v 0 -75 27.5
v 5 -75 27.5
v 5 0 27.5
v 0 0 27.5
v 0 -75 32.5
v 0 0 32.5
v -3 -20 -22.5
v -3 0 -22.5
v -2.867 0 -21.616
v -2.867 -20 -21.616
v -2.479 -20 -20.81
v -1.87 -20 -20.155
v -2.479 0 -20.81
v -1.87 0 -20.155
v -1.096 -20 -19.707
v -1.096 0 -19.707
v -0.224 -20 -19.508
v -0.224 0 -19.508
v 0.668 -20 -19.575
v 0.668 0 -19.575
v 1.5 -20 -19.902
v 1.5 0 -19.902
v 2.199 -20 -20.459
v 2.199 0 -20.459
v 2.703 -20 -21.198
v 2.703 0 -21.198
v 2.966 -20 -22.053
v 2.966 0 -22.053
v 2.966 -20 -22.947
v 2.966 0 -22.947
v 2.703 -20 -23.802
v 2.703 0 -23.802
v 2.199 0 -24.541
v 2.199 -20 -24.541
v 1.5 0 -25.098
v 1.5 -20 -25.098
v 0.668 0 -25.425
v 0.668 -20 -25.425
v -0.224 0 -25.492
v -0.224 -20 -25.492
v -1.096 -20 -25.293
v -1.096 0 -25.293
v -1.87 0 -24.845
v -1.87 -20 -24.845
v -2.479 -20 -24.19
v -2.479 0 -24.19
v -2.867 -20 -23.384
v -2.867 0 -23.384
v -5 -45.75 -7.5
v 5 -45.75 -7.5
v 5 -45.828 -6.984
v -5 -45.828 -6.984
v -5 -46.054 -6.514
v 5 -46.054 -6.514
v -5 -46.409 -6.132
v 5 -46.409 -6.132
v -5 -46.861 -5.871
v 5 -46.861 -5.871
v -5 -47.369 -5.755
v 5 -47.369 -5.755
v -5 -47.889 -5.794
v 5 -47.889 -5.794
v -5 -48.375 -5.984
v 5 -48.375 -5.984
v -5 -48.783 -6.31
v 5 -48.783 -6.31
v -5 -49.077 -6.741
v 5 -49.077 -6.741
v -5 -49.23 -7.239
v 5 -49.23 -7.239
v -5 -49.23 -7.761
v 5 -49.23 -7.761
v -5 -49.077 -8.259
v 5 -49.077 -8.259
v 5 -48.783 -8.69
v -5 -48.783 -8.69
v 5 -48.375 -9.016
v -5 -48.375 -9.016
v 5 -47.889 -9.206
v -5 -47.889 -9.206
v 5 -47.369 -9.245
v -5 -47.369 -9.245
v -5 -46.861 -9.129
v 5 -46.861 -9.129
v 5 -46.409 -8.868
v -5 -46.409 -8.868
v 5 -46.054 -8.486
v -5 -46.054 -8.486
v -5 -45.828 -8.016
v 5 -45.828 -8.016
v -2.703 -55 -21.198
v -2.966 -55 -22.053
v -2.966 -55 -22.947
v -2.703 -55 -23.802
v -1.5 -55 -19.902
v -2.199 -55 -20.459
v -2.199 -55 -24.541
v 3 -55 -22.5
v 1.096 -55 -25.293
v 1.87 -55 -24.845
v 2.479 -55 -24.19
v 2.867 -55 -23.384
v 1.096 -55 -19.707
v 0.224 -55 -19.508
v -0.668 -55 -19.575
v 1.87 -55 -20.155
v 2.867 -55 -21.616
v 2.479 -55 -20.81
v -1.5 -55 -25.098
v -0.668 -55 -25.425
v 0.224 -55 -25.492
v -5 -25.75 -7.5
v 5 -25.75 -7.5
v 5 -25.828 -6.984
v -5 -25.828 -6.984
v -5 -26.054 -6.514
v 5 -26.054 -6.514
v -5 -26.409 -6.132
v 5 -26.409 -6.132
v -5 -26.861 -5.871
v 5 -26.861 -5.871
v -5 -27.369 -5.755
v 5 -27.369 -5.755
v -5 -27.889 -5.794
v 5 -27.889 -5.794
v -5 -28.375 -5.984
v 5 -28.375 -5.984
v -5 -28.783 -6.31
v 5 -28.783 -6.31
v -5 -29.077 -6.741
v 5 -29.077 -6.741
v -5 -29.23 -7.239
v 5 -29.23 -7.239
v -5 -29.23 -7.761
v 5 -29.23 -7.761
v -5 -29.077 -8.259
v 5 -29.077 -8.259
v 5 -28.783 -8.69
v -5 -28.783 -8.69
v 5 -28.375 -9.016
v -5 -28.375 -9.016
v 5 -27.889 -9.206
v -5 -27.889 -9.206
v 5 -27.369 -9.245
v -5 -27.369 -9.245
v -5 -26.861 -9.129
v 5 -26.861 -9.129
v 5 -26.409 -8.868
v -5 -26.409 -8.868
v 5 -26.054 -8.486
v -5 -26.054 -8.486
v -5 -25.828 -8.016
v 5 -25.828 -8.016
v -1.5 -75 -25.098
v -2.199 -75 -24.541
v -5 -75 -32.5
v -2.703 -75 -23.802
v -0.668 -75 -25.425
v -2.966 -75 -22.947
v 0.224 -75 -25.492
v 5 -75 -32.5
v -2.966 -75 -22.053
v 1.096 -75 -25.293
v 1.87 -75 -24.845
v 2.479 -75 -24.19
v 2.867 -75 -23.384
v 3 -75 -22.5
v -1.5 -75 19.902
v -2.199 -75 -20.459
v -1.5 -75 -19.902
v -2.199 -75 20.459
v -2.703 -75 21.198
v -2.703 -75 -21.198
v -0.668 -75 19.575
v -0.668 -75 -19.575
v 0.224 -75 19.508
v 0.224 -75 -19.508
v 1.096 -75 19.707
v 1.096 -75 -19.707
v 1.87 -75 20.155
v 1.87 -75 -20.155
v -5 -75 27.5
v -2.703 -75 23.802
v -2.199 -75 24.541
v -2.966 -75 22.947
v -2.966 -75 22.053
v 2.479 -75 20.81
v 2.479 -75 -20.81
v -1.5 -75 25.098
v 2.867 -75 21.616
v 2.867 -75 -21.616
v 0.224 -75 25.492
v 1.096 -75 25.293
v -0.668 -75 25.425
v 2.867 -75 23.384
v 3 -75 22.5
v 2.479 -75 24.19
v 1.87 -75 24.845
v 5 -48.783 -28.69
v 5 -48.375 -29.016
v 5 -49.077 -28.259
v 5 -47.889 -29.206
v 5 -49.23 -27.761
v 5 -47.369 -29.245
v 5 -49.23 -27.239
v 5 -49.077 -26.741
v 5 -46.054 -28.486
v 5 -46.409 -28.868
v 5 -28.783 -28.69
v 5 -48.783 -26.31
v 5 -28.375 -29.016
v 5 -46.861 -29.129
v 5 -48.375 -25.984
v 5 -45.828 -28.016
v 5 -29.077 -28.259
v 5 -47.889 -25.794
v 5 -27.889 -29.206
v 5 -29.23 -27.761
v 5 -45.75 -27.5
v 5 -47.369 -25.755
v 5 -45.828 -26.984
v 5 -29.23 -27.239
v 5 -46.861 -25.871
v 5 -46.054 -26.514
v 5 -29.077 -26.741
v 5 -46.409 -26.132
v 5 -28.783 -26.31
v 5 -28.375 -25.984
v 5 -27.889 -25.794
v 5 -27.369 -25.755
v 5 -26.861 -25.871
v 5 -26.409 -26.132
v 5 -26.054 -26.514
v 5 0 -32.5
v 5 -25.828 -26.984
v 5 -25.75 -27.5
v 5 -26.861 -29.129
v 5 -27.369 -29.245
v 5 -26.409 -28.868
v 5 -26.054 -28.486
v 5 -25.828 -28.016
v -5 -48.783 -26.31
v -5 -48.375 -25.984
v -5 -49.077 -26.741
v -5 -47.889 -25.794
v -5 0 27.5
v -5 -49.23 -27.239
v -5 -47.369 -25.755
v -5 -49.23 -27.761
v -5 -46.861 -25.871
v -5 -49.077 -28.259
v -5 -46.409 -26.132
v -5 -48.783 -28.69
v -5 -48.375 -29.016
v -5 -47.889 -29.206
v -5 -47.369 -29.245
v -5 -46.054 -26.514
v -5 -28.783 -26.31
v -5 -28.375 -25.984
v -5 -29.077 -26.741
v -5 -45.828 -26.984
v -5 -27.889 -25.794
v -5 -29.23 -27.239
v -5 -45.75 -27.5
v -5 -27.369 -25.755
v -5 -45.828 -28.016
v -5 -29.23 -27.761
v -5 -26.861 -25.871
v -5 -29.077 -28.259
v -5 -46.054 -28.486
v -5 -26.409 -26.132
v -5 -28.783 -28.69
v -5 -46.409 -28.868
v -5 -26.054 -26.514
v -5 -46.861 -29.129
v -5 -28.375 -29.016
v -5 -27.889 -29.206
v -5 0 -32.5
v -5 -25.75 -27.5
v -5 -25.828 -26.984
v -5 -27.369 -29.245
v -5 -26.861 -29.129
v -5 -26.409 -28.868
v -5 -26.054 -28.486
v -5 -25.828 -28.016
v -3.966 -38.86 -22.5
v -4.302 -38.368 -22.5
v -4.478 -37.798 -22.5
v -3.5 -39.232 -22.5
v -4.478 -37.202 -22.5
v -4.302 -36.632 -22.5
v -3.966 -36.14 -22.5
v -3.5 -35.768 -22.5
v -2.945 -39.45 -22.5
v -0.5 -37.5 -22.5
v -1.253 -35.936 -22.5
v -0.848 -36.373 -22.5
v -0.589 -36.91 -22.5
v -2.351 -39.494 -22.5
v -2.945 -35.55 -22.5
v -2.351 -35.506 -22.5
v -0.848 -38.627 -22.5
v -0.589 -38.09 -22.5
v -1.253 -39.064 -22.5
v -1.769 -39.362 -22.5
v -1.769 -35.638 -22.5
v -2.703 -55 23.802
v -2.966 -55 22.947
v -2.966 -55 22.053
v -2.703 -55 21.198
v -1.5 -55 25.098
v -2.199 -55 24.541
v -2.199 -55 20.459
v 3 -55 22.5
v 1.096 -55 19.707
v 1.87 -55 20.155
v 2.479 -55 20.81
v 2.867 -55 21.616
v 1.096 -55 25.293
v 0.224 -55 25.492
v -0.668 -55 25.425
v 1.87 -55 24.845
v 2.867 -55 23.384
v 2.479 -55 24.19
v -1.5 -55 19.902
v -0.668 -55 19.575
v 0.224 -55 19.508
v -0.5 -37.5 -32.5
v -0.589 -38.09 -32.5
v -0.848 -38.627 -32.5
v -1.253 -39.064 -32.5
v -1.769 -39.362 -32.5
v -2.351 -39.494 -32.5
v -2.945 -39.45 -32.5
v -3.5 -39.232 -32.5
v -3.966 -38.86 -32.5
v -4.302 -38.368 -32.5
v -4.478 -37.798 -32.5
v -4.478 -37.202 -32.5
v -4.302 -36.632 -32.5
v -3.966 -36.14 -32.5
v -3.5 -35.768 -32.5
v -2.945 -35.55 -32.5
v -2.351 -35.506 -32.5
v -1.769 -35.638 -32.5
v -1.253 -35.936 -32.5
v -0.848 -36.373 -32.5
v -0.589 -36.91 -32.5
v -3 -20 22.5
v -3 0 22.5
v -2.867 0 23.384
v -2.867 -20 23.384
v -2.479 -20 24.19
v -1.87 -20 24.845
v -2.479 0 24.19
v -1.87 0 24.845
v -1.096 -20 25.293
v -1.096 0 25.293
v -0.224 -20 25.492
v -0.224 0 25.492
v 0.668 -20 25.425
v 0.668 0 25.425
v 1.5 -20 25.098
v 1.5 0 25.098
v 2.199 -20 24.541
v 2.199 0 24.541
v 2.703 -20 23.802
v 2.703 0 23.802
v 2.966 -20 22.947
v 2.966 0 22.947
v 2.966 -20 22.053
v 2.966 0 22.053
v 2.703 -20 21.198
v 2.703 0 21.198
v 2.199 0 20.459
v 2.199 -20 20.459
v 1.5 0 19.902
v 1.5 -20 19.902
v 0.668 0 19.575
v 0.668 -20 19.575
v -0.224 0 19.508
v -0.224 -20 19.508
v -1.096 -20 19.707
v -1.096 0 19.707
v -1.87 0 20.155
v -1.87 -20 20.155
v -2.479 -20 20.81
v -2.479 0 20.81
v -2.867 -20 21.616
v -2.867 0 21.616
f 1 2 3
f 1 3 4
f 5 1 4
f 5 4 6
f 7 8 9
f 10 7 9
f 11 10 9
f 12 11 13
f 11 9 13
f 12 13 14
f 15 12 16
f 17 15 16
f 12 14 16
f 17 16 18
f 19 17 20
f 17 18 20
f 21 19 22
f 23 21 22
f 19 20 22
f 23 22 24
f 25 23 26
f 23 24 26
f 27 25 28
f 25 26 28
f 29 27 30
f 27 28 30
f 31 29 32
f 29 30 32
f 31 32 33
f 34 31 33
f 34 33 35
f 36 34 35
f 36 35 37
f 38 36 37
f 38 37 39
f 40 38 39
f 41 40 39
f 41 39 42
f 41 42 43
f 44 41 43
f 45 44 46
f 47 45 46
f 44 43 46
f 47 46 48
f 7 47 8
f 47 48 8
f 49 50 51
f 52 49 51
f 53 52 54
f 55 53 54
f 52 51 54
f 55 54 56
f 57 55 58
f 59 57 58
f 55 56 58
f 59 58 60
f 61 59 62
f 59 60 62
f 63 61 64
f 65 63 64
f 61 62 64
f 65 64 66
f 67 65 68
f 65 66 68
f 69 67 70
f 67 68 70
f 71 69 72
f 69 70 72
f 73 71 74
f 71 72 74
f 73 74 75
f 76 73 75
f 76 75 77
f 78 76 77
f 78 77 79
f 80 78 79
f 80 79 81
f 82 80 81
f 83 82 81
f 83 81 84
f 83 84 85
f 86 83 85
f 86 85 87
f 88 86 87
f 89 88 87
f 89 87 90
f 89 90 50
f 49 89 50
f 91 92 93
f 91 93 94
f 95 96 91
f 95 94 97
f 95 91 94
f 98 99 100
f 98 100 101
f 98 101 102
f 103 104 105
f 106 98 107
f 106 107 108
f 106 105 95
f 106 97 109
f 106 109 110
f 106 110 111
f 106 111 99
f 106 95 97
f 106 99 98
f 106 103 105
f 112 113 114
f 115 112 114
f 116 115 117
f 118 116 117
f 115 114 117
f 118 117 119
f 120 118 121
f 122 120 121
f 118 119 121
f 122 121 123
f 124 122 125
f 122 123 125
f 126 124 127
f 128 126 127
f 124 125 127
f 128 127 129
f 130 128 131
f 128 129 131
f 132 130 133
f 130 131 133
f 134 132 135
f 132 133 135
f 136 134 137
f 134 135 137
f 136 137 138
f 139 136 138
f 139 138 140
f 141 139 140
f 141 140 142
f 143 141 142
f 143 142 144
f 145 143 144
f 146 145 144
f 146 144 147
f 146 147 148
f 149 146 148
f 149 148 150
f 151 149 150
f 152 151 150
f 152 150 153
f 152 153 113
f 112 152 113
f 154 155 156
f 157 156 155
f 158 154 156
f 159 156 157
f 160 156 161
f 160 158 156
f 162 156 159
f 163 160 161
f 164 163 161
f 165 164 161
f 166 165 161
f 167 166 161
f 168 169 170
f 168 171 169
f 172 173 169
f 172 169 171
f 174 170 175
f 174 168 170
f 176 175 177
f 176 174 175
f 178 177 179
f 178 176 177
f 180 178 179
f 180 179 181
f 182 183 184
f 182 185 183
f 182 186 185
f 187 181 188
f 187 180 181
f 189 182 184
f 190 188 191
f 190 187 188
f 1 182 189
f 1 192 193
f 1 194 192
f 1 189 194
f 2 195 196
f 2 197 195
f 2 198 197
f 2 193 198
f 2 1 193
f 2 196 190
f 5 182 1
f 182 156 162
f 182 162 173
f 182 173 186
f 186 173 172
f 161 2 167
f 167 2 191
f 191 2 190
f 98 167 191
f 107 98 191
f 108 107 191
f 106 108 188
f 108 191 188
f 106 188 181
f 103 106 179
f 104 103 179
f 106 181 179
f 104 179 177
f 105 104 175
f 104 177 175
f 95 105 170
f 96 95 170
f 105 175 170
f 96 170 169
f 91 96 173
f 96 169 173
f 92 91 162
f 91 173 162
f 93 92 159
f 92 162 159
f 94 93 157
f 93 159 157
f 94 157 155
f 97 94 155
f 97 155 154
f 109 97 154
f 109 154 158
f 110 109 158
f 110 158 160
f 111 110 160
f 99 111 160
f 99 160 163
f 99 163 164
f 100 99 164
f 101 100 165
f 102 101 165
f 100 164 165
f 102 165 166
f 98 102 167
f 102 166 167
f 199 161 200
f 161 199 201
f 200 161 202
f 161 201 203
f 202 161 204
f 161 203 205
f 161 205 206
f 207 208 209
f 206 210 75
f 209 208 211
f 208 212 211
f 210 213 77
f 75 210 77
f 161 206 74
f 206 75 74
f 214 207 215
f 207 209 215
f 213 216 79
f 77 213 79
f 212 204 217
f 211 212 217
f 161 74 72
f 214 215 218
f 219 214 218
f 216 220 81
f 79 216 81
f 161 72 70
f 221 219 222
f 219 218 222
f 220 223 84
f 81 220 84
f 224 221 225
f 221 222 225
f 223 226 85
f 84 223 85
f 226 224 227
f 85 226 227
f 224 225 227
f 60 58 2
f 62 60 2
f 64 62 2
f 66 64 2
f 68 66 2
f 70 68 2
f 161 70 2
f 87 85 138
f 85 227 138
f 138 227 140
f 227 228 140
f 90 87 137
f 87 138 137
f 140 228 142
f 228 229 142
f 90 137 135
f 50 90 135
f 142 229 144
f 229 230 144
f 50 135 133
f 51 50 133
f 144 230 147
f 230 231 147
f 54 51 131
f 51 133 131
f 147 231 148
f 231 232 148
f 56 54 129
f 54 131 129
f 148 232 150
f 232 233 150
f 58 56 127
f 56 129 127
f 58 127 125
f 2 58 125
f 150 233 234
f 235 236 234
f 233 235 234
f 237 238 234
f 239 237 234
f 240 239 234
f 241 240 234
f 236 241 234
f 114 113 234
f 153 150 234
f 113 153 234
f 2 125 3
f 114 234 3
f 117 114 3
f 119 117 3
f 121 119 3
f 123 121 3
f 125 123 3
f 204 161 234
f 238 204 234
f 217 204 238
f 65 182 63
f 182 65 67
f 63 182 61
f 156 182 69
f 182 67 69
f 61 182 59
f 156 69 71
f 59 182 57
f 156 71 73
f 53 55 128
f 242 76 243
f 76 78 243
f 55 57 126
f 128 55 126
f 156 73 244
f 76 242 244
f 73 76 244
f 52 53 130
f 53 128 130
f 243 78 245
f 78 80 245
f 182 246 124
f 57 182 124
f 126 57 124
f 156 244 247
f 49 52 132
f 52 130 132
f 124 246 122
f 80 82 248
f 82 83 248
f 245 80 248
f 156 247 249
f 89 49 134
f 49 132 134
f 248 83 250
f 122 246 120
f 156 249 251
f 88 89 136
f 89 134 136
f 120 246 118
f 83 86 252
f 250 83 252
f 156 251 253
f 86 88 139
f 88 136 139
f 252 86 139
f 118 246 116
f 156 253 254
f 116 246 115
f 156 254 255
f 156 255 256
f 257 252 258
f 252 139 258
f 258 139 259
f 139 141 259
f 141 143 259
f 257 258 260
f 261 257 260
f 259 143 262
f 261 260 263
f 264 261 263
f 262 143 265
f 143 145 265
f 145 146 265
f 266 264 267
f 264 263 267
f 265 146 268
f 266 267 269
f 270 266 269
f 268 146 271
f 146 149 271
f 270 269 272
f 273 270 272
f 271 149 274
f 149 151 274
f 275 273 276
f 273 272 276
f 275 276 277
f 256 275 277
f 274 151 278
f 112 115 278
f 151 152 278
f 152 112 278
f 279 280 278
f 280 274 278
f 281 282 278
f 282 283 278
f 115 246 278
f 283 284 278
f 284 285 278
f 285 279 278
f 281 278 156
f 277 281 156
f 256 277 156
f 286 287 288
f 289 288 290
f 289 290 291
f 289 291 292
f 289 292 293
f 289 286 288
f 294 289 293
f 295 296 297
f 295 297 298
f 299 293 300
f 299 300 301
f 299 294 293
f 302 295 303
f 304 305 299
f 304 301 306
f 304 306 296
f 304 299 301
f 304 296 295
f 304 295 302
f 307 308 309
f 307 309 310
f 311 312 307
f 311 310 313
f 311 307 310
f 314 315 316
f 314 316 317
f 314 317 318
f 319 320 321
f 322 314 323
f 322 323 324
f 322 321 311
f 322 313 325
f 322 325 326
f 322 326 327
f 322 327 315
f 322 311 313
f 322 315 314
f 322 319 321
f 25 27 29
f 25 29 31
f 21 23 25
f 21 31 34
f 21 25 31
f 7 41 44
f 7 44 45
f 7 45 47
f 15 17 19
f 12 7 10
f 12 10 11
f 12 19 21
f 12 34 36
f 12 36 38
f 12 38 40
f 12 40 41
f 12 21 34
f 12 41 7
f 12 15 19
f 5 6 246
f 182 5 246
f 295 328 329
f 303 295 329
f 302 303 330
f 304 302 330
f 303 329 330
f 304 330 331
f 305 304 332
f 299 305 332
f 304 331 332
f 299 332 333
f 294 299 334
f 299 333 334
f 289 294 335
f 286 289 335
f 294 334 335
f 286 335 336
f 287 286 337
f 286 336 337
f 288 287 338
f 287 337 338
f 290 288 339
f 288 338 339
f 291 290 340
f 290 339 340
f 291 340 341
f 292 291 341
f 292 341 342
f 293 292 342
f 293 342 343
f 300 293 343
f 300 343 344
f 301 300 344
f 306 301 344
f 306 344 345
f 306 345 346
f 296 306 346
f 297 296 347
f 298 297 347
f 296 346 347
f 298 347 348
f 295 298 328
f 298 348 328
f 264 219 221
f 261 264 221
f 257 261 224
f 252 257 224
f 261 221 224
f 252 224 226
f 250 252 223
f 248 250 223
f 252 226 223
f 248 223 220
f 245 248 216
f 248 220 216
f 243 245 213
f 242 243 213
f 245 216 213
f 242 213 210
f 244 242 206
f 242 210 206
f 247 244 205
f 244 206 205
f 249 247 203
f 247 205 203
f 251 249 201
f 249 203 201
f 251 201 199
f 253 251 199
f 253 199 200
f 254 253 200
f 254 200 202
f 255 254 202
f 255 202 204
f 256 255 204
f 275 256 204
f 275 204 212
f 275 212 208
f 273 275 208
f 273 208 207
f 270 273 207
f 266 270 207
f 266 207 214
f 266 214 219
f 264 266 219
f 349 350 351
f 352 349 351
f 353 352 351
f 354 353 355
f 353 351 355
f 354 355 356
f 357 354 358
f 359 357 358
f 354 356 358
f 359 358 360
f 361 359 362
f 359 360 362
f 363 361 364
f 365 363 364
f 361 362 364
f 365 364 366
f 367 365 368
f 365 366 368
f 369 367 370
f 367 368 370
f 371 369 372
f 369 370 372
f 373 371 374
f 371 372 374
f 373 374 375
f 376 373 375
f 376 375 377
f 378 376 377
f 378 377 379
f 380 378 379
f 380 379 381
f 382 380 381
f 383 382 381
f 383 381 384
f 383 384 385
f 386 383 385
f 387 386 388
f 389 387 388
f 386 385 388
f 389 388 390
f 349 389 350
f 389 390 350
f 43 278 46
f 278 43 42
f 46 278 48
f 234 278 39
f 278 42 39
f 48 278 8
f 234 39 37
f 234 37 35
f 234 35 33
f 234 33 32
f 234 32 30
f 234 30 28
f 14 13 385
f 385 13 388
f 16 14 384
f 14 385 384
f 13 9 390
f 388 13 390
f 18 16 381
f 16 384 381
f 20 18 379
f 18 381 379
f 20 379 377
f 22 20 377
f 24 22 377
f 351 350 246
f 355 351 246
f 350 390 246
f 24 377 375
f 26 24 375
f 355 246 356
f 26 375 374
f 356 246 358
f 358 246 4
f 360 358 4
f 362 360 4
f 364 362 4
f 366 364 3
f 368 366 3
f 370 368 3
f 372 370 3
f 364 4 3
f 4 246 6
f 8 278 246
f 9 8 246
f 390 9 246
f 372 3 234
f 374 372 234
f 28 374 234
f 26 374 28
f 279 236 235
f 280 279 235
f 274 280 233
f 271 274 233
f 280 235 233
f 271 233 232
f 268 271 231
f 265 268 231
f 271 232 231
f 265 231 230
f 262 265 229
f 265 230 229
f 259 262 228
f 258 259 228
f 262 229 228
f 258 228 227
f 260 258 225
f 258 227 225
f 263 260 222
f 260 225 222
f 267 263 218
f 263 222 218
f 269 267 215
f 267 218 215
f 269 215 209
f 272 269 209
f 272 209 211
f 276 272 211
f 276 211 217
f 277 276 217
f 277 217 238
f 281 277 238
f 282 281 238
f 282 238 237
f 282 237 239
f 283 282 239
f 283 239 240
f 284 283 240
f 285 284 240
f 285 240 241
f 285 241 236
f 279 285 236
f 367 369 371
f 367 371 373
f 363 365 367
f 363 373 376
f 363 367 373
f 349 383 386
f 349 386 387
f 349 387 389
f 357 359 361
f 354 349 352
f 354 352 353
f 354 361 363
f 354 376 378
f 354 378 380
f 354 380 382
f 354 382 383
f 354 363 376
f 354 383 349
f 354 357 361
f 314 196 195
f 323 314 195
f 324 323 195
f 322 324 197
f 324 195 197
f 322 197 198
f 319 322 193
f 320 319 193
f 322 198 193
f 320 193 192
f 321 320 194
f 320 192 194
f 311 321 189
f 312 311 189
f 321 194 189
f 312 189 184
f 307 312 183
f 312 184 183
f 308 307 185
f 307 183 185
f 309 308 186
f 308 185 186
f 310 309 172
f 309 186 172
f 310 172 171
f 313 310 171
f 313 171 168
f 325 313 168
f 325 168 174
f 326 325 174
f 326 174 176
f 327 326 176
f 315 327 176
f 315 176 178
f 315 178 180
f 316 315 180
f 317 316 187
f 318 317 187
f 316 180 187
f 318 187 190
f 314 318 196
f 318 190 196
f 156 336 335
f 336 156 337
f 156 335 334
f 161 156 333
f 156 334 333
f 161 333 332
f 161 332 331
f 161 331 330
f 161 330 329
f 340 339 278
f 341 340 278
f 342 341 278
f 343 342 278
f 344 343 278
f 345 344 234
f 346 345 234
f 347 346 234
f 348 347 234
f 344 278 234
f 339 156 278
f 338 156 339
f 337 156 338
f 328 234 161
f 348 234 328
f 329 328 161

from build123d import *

# Parameters (mm, degrees)
F1_DEPTH  = 75
F3_R      = 1.75
F4_DEPTH  = 25
F6_R      = 3
F7_DEPTH  = 20
F8_R      = 3
F9_DEPTH  = 20
F10_R     = 3
F11_DEPTH = 20
F12_R     = 3
F13_DEPTH = 20
F2_R      = 2
F14_DEPTH = 10
F15_DEPTH = 25
F16_DEPTH = 25
F17_DEPTH = 25


with BuildPart() as f1:
    # F0 (on Front) → F1 (new body)
    with BuildSketch(Plane.XZ):
        Polygon((-5, 27.5), (-5, -32.5), (5, -32.5), (5, 27.5), (0, 27.5), (0, 32.5), align=None)
    extrude(amount=F1_DEPTH)

    # F3 (on face) → F4 (cut)
    with BuildSketch(Plane.YZ.offset(5)):
        with Locations((-27.5, -7.5)):
            Circle(F3_R)
        with Locations((-47.5, -7.5)):
            Circle(F3_R)
        with Locations((-27.5, -27.5)):
            Circle(F3_R)
        with Locations((-47.5, -27.5)):
            Circle(F3_R)
    extrude(amount=-F4_DEPTH, mode=Mode.SUBTRACT)

    # F6 (on face) → F7 (cut)
    with BuildSketch(Plane(origin=(0, 0, 0), x_dir=(-1, 0, 0), z_dir=(0, 1, 0))):
        with Locations((0, -22.5)):
            Circle(F6_R)
    extrude(amount=-F7_DEPTH, mode=Mode.SUBTRACT)

    # F8 (on face) → F9 (cut)
    with BuildSketch(Plane.XZ.offset(75)):
        with Locations((0, 22.5)):
            Circle(F8_R)
    extrude(amount=-F9_DEPTH, mode=Mode.SUBTRACT)

    # F10 (on face) → F11 (cut)
    with BuildSketch(Plane.XZ.offset(75)):
        with Locations((0, -22.5)):
            Circle(F10_R)
    extrude(amount=-F11_DEPTH, mode=Mode.SUBTRACT)

    # F12 (on face) → F13 (cut)
    with BuildSketch(Plane(origin=(0, 0, 0), x_dir=(-1, 0, 0), z_dir=(0, 1, 0))):
        with Locations((0, 22.5)):
            Circle(F12_R)
    extrude(amount=-F13_DEPTH, mode=Mode.SUBTRACT)

    # F2 (on face) → F14 (cut)
    with BuildSketch(Plane(origin=(0, 0, -32.5), x_dir=(1, 0, 0), z_dir=(0, 0, -1))):
        with Locations((-2.5, 37.5)):
            Circle(F2_R)
    extrude(amount=-F14_DEPTH, mode=Mode.SUBTRACT)

    # F3 (on face) → F15 (cut)
    with BuildSketch(Plane.YZ.offset(5)):
        with Locations((-27.5, -7.5)):
            Circle(F3_R)
        with Locations((-47.5, -7.5)):
            Circle(F3_R)
        with Locations((-27.5, -27.5)):
            Circle(F3_R)
        with Locations((-47.5, -27.5)):
            Circle(F3_R)
    extrude(amount=-F15_DEPTH, mode=Mode.SUBTRACT)

    # F3 (on face) → F16 (cut)
    with BuildSketch(Plane.YZ.offset(5)):
        with Locations((-27.5, -7.5)):
            Circle(F3_R)
        with Locations((-47.5, -7.5)):
            Circle(F3_R)
        with Locations((-27.5, -27.5)):
            Circle(F3_R)
        with Locations((-47.5, -27.5)):
            Circle(F3_R)
    extrude(amount=-F16_DEPTH, mode=Mode.SUBTRACT)

    # F3 (on face) → F17 (cut)
    with BuildSketch(Plane.YZ.offset(5)):
        with Locations((-27.5, -7.5)):
            Circle(F3_R)
        with Locations((-47.5, -7.5)):
            Circle(F3_R)
        with Locations((-27.5, -27.5)):
            Circle(F3_R)
        with Locations((-47.5, -27.5)):
            Circle(F3_R)
    extrude(amount=-F17_DEPTH, mode=Mode.SUBTRACT)


solid = f1.part
